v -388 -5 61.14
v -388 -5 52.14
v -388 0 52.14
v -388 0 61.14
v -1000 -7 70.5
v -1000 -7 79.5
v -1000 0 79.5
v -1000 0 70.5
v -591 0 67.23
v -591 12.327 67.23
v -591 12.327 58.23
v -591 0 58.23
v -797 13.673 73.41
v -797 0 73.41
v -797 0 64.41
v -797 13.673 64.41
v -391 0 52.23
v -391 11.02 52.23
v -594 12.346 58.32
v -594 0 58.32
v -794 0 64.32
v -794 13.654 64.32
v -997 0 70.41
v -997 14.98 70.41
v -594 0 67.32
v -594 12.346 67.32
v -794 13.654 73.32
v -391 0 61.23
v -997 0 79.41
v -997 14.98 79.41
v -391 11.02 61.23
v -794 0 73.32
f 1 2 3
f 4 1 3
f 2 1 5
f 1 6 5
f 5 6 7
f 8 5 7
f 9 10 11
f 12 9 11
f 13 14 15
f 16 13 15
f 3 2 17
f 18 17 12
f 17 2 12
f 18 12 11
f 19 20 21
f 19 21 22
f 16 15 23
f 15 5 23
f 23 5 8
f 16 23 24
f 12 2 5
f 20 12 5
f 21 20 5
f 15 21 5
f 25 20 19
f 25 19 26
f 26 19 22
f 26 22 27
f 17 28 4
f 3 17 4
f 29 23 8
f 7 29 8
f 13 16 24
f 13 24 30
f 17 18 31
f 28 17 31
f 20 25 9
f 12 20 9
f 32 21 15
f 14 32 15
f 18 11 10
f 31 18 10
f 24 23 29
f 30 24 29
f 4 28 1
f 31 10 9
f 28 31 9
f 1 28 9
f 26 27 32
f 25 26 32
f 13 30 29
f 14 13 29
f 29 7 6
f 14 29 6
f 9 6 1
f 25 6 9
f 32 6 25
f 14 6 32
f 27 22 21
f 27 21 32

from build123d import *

# Parameters (mm, degrees)
SKETCH_1_W               = 3
SKETCH_1_H               = 240
SKETCH_1_H_2             = 261.76139272
SKETCH_1_H_3             = 230.081843935
CUT_EXTRUDE_2_DEPTH      = 20
CUT_EXTRUDE_7_DEPTH      = 30
CUT_EXTRUDE_8_DEPTH      = 1004.267287526
CUT_EXTRUDE_8_DEPTH_BACK = 1004.267287526
SKETCH_10_W              = 715.558025108
SKETCH_10_H              = 147.805868661


with BuildPart() as part:
    # Эскиз4 → По сечениям1 section 0
    with BuildSketch(Plane(origin=(-1000, 0, 0), x_dir=(0, 0, -1), z_dir=(1, 0, 0))):
        with BuildLine():
            Line((70.5, 15), (70.5, -7))
            Line((70.5, -7), (79.5, -7))
            Line((79.5, -7), (79.5, 15))
            Line((79.5, 15), (70.5, 15))
        make_face()
    # Эскиз5 → По сечениям1 section 1
    with BuildSketch(Plane(origin=(-388, 0, 0), x_dir=(0, 0, -1), z_dir=(1, 0, 0))):
        with BuildLine():
            Line((61.14, 11), (52.14, 11))
            Line((52.14, 11), (52.14, -5))
            Line((52.14, -5), (61.14, -5))
            Line((61.14, -5), (61.14, 11))
        make_face()
    loft()

    # Эскиз1 → Вырез-Вытянуть2 (cut)
    with BuildSketch(Plane(origin=(0, 0, 0), x_dir=(1, 0, 0), z_dir=(0, 1, 0))):
        with Locations((-998.5, 120)):
            Rectangle(SKETCH_1_W, SKETCH_1_H)
        Polygon((-388, 184.92), (-391, 185.19), (-391, 0), (-388, 0), align=None)
        with Locations((-795.5, 130.88069636)):
            Rectangle(SKETCH_1_W, SKETCH_1_H_2)
        with Locations((-592.5, 115.040921968)):
            Rectangle(SKETCH_1_W, SKETCH_1_H_3)
    extrude(amount=-CUT_EXTRUDE_2_DEPTH, mode=Mode.SUBTRACT)

    # Эскиз10 → Вырез-Вытянуть8 (cut, two sides: drawn at the far end of the back side and taken through both)
    with BuildSketch(Plane(origin=(0, 0, 0), x_dir=(1, 0, 0), z_dir=(0, 1, 0)).offset(-CUT_EXTRUDE_8_DEPTH_BACK)):
        with Locations((-683.215880827, 67.559334818)):
            Rectangle(SKETCH_10_W, SKETCH_10_H)
    extrude(amount=CUT_EXTRUDE_8_DEPTH + CUT_EXTRUDE_8_DEPTH_BACK, mode=Mode.SUBTRACT)


with BuildPart() as body_2:
    # Эскиз7 → По сечениям4 section 0
    with BuildSketch(Plane(origin=(-388, 0, 0), x_dir=(0, 0, -1), z_dir=(1, 0, 0))):
        with BuildLine():
            Line((-61.14, -5), (-52.14, -5))
            Line((-52.14, -5), (-52.14, 11))
            Line((-52.14, 11), (-61.14, 11))
            Line((-61.14, 11), (-61.14, -5))
        make_face()
    # Эскиз8 → По сечениям4 section 1
    with BuildSketch(Plane.ZY.offset(1000)):
        with BuildLine():
            Line((70.5, -7), (79.5, -7))
            Line((79.5, -7), (79.5, 15))
            Line((79.5, 15), (70.5, 15))
            Line((70.5, 15), (70.5, -7))
        make_face()
    loft()

    # Эскиз6 → Вырез-Вытянуть7 (cut)
    with BuildSketch(Plane(origin=(0, 0, 0), x_dir=(1, 0, 0), z_dir=(0, 1, 0))):
        Polygon((-391, -52.23), (-391, -61.23), (-388, -61.14), (-388, -52.14), align=None)
        Polygon((-794, -64.32), (-794, -73.32), (-797, -73.41), (-797, -64.41), align=None)
        Polygon((-997, -70.41), (-997, -79.41), (-1000, -79.5), (-1000, -70.5), align=None)
        Polygon((-594, -58.32), (-594, -67.32), (-591, -67.23), (-591, -58.23), align=None)
    extrude(amount=CUT_EXTRUDE_7_DEPTH, mode=Mode.SUBTRACT)


solid = body_2.part
